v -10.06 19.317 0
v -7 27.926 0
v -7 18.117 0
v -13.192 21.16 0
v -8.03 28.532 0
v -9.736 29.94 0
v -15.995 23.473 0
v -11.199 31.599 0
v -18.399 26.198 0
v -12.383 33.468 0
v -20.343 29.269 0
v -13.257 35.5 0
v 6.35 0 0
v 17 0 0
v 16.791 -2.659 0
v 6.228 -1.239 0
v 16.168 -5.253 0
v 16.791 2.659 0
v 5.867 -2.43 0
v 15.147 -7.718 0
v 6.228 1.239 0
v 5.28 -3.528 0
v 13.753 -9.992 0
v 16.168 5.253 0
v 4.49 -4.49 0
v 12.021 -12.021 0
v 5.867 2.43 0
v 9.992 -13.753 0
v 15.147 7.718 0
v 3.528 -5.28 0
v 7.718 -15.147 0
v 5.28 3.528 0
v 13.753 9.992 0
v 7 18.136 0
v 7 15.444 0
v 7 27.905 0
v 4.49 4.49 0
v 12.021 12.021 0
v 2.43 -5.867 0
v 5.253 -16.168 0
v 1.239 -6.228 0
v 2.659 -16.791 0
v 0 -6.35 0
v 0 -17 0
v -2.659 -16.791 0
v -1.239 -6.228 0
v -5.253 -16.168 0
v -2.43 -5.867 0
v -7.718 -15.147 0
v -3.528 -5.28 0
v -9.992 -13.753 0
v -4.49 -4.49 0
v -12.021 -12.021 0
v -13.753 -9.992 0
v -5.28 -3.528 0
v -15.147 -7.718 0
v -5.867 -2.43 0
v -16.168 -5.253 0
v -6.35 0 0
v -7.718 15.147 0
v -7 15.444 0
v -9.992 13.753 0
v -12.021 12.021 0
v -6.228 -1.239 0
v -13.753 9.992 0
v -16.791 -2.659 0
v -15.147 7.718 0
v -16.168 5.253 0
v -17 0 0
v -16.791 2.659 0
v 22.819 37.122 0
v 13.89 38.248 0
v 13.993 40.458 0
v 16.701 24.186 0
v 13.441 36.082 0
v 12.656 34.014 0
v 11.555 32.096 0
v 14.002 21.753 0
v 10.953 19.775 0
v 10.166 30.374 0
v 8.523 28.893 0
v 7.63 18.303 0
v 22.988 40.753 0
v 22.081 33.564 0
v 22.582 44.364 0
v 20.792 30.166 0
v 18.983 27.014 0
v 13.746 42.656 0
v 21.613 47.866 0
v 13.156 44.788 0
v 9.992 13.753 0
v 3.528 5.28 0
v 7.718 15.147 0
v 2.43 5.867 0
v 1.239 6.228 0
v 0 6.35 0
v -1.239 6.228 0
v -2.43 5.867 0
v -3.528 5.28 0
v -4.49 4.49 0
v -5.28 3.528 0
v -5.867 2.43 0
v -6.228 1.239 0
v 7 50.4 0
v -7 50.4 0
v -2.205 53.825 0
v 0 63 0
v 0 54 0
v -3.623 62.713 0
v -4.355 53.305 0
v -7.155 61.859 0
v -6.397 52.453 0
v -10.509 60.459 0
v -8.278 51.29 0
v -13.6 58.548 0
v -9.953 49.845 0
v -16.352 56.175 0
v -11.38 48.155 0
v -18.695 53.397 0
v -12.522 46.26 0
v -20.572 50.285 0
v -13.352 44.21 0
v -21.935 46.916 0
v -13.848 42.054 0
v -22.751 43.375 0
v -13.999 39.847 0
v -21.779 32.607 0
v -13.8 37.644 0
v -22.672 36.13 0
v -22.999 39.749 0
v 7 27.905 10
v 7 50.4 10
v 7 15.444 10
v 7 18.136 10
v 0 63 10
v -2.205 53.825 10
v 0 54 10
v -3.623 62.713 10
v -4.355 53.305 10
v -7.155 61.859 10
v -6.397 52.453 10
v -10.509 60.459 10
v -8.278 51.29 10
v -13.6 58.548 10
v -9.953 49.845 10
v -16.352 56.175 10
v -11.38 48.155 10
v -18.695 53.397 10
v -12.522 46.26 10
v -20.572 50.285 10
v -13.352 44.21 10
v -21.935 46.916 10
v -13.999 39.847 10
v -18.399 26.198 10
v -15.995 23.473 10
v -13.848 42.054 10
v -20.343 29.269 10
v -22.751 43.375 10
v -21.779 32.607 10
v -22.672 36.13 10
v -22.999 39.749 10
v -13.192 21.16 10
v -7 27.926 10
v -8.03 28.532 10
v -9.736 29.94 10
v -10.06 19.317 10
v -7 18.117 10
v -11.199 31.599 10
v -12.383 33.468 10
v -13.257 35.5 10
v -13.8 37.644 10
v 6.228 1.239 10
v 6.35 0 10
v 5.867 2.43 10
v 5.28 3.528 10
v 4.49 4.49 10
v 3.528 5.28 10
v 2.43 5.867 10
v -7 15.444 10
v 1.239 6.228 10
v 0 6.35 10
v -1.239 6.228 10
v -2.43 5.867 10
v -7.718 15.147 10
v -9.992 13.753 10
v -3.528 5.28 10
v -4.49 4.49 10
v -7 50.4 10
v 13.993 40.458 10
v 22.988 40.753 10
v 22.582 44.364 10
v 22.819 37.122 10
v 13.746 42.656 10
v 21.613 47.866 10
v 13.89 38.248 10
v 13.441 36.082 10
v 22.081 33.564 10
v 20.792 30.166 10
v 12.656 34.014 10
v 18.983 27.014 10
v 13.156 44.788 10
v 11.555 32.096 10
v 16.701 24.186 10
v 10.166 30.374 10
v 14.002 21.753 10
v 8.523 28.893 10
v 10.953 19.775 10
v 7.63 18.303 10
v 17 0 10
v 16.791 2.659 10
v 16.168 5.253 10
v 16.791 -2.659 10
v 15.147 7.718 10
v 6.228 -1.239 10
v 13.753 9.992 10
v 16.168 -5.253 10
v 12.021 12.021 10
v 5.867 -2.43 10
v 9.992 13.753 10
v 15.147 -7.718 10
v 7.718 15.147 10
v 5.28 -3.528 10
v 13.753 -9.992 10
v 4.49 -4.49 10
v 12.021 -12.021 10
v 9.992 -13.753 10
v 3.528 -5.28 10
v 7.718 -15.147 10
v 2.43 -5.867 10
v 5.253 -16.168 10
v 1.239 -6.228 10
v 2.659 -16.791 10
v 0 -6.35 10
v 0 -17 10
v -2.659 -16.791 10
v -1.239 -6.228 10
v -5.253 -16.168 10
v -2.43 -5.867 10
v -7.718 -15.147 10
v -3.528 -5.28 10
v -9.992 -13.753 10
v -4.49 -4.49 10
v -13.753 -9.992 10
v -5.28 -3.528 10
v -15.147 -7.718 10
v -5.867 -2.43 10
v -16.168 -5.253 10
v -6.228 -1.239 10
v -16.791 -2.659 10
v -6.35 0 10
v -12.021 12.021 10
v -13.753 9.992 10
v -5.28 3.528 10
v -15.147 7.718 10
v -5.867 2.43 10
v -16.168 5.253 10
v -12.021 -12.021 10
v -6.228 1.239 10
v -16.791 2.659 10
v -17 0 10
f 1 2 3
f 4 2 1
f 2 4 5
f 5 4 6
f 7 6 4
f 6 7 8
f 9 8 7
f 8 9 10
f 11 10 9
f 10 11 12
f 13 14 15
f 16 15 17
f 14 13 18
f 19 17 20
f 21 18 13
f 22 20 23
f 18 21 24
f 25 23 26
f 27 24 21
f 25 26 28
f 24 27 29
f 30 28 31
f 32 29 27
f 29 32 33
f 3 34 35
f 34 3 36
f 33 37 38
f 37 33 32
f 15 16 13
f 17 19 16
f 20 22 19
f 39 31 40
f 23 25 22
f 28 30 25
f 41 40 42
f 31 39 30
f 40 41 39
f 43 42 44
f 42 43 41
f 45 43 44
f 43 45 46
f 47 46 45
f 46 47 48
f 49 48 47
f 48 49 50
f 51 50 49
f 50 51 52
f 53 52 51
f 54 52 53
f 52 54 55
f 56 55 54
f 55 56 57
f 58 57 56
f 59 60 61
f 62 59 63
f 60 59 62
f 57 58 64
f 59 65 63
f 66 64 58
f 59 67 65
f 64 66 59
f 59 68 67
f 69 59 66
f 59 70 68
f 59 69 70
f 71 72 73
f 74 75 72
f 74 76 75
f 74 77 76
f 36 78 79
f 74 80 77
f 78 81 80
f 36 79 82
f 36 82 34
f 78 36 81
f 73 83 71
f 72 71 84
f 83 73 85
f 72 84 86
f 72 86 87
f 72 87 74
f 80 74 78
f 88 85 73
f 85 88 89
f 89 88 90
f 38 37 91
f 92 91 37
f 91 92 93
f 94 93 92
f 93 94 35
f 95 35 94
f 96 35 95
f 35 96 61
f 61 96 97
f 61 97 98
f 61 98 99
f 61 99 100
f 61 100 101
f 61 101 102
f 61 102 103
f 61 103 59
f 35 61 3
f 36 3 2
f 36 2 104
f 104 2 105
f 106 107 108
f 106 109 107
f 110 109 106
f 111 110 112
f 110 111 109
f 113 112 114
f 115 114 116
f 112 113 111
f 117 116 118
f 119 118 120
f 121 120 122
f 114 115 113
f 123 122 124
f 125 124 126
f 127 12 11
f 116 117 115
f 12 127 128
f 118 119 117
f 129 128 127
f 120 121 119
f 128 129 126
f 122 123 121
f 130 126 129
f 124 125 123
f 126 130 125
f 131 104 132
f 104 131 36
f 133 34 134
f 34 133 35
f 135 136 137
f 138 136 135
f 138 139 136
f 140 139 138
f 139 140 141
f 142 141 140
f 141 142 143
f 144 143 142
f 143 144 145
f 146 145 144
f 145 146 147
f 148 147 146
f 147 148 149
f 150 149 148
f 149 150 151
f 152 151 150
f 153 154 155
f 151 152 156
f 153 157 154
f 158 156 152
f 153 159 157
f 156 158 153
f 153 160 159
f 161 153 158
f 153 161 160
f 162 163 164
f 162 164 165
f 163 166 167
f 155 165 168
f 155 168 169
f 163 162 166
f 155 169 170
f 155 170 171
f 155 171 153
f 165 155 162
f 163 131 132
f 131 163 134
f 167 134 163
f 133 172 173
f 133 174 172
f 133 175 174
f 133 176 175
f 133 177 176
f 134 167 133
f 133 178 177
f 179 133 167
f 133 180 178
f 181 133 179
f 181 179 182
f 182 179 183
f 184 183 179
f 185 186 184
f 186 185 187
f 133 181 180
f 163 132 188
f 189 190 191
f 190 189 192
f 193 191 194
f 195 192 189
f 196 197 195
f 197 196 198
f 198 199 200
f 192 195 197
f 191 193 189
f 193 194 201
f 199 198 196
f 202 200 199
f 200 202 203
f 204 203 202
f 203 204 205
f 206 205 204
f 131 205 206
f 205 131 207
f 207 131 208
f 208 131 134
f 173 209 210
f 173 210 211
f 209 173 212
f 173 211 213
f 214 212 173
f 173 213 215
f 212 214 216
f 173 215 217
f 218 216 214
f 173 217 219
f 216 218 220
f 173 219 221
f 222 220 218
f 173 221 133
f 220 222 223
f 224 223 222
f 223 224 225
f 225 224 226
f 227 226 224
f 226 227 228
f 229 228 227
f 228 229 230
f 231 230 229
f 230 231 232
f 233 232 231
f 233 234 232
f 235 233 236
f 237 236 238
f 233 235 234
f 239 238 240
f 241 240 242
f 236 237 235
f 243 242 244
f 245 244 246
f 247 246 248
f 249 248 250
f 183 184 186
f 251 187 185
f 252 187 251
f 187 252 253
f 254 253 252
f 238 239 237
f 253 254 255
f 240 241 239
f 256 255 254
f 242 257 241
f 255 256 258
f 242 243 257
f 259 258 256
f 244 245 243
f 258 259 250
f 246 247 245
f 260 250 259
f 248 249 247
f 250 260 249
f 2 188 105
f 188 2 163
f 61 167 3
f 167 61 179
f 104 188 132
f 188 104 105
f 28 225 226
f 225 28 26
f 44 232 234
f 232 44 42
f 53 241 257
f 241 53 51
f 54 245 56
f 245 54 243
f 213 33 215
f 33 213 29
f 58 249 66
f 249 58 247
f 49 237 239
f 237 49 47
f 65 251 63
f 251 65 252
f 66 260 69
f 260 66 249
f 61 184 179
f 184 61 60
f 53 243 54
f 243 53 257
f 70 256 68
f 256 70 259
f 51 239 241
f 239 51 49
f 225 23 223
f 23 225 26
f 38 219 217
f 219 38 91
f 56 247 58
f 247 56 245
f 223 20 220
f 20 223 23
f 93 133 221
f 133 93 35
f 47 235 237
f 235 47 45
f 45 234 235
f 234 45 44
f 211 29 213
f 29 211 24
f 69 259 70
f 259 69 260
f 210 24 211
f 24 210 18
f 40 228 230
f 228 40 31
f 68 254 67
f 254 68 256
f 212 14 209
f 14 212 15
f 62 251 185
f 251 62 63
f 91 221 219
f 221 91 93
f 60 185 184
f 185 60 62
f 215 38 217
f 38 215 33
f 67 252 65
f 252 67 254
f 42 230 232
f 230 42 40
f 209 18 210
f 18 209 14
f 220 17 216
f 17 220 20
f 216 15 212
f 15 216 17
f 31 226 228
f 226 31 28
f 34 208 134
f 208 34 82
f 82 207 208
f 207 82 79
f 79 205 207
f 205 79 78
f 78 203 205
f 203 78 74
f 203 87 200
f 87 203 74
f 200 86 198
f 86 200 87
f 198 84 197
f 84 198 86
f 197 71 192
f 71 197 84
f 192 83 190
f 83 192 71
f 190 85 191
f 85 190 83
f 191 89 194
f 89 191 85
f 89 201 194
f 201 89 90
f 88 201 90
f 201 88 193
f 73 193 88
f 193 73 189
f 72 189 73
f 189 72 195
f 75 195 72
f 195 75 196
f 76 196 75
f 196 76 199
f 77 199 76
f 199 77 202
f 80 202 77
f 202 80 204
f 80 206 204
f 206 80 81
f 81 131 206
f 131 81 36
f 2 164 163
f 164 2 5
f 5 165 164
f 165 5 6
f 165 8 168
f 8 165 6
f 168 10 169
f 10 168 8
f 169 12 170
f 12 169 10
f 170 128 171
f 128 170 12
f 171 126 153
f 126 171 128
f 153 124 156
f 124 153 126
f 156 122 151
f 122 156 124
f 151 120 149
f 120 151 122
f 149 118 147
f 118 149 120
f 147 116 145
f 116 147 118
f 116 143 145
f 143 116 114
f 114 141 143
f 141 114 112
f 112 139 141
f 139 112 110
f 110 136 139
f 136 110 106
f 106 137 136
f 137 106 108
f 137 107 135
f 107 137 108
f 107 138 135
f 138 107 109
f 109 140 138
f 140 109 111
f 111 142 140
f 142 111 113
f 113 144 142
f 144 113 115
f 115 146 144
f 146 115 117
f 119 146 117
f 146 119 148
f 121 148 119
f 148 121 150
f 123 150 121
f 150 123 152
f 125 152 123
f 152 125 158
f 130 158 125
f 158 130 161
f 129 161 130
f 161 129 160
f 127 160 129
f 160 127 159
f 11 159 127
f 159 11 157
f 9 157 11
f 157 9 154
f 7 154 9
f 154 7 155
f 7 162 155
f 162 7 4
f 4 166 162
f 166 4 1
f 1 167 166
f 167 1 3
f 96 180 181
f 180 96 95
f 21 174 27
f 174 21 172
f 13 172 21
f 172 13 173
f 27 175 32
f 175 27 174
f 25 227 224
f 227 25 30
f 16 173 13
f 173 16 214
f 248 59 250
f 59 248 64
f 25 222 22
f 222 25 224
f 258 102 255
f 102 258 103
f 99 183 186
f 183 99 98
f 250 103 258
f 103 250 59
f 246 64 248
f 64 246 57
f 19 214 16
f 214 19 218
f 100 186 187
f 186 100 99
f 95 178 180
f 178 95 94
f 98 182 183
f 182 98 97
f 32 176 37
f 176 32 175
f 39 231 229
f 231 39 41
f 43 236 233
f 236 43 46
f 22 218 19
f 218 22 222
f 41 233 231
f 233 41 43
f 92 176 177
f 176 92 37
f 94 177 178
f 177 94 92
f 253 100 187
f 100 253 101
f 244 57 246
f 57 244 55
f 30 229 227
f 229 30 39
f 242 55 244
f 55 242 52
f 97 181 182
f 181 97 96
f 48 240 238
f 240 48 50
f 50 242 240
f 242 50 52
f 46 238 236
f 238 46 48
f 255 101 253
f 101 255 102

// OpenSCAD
$fn = 32;

// ----------------------------------------------------------------------
// Hook: 80 mm shank into a 14 mm curl, 10 mm thick
// ----------------------------------------------------------------------

// --- parameters (mm) ---
shank_len = 80;           // shank length from the boss centre
shank_w = 14;             // shank width
boss_d = 34;              // boss diameter
bore_d = 12.7;            // boss bore
curl_in = 14;             // curl inner radius
curl_out = 23;            // curl outer radius
curl_sweep = 290;         // curl sweep angle
hook_t = 10;              // hook thickness

shank_profile = [[-7, 50.4], [7, 50.4], [7, 15], [-7, 15]];
boss_profile = [[17, 0], [16.791, 2.659], [16.168, 5.253], [15.147, 7.718], [13.753, 9.992], [12.021, 12.021], [9.992, 13.753], [7.718, 15.147], [5.253, 16.168], [2.659, 16.791], [0, 17], [-2.659, 16.791], [-5.253, 16.168], [-7.718, 15.147], [-9.992, 13.753], [-12.021, 12.021], [-13.753, 9.992], [-15.147, 7.718], [-16.168, 5.253], [-16.791, 2.659], [-17, 0], [-16.791, -2.659], [-16.168, -5.253], [-15.147, -7.718], [-13.753, -9.992], [-12.021, -12.021], [-9.992, -13.753], [-7.718, -15.147], [-5.253, -16.168], [-2.659, -16.791], [0, -17], [2.659, -16.791], [5.253, -16.168], [7.718, -15.147], [9.992, -13.753], [12.021, -12.021], [13.753, -9.992], [15.147, -7.718], [16.168, -5.253], [16.791, -2.659]];
curl_profile = [[0, 63], [-3.623, 62.713], [-7.155, 61.859], [-10.509, 60.459], [-13.6, 58.548], [-16.352, 56.175], [-18.695, 53.397], [-20.572, 50.285], [-21.935, 46.916], [-22.751, 43.375], [-22.999, 39.749], [-22.672, 36.13], [-21.779, 32.607], [-20.343, 29.269], [-18.399, 26.198], [-15.995, 23.473], [-13.192, 21.16], [-10.06, 19.317], [-6.677, 17.99], [-3.126, 17.213], [0.502, 17.005], [4.117, 17.372], [7.63, 18.303], [10.953, 19.775], [14.002, 21.753], [16.701, 24.186], [18.983, 27.014], [20.792, 30.166], [22.081, 33.564], [22.819, 37.122], [22.988, 40.753], [22.582, 44.364], [21.613, 47.866], [13.156, 44.788], [13.746, 42.656], [13.993, 40.458], [13.89, 38.248], [13.441, 36.082], [12.656, 34.014], [11.555, 32.096], [10.166, 30.374], [8.523, 28.893], [6.667, 27.689], [4.644, 26.793], [2.506, 26.226], [0.305, 26.003], [-1.903, 26.13], [-4.064, 26.603], [-6.123, 27.41], [-8.03, 28.532], [-9.736, 29.94], [-11.199, 31.599], [-12.383, 33.468], [-13.257, 35.5], [-13.8, 37.644], [-13.999, 39.847], [-13.848, 42.054], [-13.352, 44.21], [-12.522, 46.26], [-11.38, 48.155], [-9.953, 49.845], [-8.278, 51.29], [-6.397, 52.453], [-4.355, 53.305], [-2.205, 53.825], [0, 54]];

difference() {
  union() {
    /* three overlapping outlines: shank, boss and the smooth curl */
    linear_extrude(height = hook_t) polygon(shank_profile);
    linear_extrude(height = hook_t) polygon(boss_profile);
    linear_extrude(height = hook_t) polygon(curl_profile);
  }
  translate([0, 0, -2.5]) cylinder(h = hook_t + 5, d = bore_d);
}
